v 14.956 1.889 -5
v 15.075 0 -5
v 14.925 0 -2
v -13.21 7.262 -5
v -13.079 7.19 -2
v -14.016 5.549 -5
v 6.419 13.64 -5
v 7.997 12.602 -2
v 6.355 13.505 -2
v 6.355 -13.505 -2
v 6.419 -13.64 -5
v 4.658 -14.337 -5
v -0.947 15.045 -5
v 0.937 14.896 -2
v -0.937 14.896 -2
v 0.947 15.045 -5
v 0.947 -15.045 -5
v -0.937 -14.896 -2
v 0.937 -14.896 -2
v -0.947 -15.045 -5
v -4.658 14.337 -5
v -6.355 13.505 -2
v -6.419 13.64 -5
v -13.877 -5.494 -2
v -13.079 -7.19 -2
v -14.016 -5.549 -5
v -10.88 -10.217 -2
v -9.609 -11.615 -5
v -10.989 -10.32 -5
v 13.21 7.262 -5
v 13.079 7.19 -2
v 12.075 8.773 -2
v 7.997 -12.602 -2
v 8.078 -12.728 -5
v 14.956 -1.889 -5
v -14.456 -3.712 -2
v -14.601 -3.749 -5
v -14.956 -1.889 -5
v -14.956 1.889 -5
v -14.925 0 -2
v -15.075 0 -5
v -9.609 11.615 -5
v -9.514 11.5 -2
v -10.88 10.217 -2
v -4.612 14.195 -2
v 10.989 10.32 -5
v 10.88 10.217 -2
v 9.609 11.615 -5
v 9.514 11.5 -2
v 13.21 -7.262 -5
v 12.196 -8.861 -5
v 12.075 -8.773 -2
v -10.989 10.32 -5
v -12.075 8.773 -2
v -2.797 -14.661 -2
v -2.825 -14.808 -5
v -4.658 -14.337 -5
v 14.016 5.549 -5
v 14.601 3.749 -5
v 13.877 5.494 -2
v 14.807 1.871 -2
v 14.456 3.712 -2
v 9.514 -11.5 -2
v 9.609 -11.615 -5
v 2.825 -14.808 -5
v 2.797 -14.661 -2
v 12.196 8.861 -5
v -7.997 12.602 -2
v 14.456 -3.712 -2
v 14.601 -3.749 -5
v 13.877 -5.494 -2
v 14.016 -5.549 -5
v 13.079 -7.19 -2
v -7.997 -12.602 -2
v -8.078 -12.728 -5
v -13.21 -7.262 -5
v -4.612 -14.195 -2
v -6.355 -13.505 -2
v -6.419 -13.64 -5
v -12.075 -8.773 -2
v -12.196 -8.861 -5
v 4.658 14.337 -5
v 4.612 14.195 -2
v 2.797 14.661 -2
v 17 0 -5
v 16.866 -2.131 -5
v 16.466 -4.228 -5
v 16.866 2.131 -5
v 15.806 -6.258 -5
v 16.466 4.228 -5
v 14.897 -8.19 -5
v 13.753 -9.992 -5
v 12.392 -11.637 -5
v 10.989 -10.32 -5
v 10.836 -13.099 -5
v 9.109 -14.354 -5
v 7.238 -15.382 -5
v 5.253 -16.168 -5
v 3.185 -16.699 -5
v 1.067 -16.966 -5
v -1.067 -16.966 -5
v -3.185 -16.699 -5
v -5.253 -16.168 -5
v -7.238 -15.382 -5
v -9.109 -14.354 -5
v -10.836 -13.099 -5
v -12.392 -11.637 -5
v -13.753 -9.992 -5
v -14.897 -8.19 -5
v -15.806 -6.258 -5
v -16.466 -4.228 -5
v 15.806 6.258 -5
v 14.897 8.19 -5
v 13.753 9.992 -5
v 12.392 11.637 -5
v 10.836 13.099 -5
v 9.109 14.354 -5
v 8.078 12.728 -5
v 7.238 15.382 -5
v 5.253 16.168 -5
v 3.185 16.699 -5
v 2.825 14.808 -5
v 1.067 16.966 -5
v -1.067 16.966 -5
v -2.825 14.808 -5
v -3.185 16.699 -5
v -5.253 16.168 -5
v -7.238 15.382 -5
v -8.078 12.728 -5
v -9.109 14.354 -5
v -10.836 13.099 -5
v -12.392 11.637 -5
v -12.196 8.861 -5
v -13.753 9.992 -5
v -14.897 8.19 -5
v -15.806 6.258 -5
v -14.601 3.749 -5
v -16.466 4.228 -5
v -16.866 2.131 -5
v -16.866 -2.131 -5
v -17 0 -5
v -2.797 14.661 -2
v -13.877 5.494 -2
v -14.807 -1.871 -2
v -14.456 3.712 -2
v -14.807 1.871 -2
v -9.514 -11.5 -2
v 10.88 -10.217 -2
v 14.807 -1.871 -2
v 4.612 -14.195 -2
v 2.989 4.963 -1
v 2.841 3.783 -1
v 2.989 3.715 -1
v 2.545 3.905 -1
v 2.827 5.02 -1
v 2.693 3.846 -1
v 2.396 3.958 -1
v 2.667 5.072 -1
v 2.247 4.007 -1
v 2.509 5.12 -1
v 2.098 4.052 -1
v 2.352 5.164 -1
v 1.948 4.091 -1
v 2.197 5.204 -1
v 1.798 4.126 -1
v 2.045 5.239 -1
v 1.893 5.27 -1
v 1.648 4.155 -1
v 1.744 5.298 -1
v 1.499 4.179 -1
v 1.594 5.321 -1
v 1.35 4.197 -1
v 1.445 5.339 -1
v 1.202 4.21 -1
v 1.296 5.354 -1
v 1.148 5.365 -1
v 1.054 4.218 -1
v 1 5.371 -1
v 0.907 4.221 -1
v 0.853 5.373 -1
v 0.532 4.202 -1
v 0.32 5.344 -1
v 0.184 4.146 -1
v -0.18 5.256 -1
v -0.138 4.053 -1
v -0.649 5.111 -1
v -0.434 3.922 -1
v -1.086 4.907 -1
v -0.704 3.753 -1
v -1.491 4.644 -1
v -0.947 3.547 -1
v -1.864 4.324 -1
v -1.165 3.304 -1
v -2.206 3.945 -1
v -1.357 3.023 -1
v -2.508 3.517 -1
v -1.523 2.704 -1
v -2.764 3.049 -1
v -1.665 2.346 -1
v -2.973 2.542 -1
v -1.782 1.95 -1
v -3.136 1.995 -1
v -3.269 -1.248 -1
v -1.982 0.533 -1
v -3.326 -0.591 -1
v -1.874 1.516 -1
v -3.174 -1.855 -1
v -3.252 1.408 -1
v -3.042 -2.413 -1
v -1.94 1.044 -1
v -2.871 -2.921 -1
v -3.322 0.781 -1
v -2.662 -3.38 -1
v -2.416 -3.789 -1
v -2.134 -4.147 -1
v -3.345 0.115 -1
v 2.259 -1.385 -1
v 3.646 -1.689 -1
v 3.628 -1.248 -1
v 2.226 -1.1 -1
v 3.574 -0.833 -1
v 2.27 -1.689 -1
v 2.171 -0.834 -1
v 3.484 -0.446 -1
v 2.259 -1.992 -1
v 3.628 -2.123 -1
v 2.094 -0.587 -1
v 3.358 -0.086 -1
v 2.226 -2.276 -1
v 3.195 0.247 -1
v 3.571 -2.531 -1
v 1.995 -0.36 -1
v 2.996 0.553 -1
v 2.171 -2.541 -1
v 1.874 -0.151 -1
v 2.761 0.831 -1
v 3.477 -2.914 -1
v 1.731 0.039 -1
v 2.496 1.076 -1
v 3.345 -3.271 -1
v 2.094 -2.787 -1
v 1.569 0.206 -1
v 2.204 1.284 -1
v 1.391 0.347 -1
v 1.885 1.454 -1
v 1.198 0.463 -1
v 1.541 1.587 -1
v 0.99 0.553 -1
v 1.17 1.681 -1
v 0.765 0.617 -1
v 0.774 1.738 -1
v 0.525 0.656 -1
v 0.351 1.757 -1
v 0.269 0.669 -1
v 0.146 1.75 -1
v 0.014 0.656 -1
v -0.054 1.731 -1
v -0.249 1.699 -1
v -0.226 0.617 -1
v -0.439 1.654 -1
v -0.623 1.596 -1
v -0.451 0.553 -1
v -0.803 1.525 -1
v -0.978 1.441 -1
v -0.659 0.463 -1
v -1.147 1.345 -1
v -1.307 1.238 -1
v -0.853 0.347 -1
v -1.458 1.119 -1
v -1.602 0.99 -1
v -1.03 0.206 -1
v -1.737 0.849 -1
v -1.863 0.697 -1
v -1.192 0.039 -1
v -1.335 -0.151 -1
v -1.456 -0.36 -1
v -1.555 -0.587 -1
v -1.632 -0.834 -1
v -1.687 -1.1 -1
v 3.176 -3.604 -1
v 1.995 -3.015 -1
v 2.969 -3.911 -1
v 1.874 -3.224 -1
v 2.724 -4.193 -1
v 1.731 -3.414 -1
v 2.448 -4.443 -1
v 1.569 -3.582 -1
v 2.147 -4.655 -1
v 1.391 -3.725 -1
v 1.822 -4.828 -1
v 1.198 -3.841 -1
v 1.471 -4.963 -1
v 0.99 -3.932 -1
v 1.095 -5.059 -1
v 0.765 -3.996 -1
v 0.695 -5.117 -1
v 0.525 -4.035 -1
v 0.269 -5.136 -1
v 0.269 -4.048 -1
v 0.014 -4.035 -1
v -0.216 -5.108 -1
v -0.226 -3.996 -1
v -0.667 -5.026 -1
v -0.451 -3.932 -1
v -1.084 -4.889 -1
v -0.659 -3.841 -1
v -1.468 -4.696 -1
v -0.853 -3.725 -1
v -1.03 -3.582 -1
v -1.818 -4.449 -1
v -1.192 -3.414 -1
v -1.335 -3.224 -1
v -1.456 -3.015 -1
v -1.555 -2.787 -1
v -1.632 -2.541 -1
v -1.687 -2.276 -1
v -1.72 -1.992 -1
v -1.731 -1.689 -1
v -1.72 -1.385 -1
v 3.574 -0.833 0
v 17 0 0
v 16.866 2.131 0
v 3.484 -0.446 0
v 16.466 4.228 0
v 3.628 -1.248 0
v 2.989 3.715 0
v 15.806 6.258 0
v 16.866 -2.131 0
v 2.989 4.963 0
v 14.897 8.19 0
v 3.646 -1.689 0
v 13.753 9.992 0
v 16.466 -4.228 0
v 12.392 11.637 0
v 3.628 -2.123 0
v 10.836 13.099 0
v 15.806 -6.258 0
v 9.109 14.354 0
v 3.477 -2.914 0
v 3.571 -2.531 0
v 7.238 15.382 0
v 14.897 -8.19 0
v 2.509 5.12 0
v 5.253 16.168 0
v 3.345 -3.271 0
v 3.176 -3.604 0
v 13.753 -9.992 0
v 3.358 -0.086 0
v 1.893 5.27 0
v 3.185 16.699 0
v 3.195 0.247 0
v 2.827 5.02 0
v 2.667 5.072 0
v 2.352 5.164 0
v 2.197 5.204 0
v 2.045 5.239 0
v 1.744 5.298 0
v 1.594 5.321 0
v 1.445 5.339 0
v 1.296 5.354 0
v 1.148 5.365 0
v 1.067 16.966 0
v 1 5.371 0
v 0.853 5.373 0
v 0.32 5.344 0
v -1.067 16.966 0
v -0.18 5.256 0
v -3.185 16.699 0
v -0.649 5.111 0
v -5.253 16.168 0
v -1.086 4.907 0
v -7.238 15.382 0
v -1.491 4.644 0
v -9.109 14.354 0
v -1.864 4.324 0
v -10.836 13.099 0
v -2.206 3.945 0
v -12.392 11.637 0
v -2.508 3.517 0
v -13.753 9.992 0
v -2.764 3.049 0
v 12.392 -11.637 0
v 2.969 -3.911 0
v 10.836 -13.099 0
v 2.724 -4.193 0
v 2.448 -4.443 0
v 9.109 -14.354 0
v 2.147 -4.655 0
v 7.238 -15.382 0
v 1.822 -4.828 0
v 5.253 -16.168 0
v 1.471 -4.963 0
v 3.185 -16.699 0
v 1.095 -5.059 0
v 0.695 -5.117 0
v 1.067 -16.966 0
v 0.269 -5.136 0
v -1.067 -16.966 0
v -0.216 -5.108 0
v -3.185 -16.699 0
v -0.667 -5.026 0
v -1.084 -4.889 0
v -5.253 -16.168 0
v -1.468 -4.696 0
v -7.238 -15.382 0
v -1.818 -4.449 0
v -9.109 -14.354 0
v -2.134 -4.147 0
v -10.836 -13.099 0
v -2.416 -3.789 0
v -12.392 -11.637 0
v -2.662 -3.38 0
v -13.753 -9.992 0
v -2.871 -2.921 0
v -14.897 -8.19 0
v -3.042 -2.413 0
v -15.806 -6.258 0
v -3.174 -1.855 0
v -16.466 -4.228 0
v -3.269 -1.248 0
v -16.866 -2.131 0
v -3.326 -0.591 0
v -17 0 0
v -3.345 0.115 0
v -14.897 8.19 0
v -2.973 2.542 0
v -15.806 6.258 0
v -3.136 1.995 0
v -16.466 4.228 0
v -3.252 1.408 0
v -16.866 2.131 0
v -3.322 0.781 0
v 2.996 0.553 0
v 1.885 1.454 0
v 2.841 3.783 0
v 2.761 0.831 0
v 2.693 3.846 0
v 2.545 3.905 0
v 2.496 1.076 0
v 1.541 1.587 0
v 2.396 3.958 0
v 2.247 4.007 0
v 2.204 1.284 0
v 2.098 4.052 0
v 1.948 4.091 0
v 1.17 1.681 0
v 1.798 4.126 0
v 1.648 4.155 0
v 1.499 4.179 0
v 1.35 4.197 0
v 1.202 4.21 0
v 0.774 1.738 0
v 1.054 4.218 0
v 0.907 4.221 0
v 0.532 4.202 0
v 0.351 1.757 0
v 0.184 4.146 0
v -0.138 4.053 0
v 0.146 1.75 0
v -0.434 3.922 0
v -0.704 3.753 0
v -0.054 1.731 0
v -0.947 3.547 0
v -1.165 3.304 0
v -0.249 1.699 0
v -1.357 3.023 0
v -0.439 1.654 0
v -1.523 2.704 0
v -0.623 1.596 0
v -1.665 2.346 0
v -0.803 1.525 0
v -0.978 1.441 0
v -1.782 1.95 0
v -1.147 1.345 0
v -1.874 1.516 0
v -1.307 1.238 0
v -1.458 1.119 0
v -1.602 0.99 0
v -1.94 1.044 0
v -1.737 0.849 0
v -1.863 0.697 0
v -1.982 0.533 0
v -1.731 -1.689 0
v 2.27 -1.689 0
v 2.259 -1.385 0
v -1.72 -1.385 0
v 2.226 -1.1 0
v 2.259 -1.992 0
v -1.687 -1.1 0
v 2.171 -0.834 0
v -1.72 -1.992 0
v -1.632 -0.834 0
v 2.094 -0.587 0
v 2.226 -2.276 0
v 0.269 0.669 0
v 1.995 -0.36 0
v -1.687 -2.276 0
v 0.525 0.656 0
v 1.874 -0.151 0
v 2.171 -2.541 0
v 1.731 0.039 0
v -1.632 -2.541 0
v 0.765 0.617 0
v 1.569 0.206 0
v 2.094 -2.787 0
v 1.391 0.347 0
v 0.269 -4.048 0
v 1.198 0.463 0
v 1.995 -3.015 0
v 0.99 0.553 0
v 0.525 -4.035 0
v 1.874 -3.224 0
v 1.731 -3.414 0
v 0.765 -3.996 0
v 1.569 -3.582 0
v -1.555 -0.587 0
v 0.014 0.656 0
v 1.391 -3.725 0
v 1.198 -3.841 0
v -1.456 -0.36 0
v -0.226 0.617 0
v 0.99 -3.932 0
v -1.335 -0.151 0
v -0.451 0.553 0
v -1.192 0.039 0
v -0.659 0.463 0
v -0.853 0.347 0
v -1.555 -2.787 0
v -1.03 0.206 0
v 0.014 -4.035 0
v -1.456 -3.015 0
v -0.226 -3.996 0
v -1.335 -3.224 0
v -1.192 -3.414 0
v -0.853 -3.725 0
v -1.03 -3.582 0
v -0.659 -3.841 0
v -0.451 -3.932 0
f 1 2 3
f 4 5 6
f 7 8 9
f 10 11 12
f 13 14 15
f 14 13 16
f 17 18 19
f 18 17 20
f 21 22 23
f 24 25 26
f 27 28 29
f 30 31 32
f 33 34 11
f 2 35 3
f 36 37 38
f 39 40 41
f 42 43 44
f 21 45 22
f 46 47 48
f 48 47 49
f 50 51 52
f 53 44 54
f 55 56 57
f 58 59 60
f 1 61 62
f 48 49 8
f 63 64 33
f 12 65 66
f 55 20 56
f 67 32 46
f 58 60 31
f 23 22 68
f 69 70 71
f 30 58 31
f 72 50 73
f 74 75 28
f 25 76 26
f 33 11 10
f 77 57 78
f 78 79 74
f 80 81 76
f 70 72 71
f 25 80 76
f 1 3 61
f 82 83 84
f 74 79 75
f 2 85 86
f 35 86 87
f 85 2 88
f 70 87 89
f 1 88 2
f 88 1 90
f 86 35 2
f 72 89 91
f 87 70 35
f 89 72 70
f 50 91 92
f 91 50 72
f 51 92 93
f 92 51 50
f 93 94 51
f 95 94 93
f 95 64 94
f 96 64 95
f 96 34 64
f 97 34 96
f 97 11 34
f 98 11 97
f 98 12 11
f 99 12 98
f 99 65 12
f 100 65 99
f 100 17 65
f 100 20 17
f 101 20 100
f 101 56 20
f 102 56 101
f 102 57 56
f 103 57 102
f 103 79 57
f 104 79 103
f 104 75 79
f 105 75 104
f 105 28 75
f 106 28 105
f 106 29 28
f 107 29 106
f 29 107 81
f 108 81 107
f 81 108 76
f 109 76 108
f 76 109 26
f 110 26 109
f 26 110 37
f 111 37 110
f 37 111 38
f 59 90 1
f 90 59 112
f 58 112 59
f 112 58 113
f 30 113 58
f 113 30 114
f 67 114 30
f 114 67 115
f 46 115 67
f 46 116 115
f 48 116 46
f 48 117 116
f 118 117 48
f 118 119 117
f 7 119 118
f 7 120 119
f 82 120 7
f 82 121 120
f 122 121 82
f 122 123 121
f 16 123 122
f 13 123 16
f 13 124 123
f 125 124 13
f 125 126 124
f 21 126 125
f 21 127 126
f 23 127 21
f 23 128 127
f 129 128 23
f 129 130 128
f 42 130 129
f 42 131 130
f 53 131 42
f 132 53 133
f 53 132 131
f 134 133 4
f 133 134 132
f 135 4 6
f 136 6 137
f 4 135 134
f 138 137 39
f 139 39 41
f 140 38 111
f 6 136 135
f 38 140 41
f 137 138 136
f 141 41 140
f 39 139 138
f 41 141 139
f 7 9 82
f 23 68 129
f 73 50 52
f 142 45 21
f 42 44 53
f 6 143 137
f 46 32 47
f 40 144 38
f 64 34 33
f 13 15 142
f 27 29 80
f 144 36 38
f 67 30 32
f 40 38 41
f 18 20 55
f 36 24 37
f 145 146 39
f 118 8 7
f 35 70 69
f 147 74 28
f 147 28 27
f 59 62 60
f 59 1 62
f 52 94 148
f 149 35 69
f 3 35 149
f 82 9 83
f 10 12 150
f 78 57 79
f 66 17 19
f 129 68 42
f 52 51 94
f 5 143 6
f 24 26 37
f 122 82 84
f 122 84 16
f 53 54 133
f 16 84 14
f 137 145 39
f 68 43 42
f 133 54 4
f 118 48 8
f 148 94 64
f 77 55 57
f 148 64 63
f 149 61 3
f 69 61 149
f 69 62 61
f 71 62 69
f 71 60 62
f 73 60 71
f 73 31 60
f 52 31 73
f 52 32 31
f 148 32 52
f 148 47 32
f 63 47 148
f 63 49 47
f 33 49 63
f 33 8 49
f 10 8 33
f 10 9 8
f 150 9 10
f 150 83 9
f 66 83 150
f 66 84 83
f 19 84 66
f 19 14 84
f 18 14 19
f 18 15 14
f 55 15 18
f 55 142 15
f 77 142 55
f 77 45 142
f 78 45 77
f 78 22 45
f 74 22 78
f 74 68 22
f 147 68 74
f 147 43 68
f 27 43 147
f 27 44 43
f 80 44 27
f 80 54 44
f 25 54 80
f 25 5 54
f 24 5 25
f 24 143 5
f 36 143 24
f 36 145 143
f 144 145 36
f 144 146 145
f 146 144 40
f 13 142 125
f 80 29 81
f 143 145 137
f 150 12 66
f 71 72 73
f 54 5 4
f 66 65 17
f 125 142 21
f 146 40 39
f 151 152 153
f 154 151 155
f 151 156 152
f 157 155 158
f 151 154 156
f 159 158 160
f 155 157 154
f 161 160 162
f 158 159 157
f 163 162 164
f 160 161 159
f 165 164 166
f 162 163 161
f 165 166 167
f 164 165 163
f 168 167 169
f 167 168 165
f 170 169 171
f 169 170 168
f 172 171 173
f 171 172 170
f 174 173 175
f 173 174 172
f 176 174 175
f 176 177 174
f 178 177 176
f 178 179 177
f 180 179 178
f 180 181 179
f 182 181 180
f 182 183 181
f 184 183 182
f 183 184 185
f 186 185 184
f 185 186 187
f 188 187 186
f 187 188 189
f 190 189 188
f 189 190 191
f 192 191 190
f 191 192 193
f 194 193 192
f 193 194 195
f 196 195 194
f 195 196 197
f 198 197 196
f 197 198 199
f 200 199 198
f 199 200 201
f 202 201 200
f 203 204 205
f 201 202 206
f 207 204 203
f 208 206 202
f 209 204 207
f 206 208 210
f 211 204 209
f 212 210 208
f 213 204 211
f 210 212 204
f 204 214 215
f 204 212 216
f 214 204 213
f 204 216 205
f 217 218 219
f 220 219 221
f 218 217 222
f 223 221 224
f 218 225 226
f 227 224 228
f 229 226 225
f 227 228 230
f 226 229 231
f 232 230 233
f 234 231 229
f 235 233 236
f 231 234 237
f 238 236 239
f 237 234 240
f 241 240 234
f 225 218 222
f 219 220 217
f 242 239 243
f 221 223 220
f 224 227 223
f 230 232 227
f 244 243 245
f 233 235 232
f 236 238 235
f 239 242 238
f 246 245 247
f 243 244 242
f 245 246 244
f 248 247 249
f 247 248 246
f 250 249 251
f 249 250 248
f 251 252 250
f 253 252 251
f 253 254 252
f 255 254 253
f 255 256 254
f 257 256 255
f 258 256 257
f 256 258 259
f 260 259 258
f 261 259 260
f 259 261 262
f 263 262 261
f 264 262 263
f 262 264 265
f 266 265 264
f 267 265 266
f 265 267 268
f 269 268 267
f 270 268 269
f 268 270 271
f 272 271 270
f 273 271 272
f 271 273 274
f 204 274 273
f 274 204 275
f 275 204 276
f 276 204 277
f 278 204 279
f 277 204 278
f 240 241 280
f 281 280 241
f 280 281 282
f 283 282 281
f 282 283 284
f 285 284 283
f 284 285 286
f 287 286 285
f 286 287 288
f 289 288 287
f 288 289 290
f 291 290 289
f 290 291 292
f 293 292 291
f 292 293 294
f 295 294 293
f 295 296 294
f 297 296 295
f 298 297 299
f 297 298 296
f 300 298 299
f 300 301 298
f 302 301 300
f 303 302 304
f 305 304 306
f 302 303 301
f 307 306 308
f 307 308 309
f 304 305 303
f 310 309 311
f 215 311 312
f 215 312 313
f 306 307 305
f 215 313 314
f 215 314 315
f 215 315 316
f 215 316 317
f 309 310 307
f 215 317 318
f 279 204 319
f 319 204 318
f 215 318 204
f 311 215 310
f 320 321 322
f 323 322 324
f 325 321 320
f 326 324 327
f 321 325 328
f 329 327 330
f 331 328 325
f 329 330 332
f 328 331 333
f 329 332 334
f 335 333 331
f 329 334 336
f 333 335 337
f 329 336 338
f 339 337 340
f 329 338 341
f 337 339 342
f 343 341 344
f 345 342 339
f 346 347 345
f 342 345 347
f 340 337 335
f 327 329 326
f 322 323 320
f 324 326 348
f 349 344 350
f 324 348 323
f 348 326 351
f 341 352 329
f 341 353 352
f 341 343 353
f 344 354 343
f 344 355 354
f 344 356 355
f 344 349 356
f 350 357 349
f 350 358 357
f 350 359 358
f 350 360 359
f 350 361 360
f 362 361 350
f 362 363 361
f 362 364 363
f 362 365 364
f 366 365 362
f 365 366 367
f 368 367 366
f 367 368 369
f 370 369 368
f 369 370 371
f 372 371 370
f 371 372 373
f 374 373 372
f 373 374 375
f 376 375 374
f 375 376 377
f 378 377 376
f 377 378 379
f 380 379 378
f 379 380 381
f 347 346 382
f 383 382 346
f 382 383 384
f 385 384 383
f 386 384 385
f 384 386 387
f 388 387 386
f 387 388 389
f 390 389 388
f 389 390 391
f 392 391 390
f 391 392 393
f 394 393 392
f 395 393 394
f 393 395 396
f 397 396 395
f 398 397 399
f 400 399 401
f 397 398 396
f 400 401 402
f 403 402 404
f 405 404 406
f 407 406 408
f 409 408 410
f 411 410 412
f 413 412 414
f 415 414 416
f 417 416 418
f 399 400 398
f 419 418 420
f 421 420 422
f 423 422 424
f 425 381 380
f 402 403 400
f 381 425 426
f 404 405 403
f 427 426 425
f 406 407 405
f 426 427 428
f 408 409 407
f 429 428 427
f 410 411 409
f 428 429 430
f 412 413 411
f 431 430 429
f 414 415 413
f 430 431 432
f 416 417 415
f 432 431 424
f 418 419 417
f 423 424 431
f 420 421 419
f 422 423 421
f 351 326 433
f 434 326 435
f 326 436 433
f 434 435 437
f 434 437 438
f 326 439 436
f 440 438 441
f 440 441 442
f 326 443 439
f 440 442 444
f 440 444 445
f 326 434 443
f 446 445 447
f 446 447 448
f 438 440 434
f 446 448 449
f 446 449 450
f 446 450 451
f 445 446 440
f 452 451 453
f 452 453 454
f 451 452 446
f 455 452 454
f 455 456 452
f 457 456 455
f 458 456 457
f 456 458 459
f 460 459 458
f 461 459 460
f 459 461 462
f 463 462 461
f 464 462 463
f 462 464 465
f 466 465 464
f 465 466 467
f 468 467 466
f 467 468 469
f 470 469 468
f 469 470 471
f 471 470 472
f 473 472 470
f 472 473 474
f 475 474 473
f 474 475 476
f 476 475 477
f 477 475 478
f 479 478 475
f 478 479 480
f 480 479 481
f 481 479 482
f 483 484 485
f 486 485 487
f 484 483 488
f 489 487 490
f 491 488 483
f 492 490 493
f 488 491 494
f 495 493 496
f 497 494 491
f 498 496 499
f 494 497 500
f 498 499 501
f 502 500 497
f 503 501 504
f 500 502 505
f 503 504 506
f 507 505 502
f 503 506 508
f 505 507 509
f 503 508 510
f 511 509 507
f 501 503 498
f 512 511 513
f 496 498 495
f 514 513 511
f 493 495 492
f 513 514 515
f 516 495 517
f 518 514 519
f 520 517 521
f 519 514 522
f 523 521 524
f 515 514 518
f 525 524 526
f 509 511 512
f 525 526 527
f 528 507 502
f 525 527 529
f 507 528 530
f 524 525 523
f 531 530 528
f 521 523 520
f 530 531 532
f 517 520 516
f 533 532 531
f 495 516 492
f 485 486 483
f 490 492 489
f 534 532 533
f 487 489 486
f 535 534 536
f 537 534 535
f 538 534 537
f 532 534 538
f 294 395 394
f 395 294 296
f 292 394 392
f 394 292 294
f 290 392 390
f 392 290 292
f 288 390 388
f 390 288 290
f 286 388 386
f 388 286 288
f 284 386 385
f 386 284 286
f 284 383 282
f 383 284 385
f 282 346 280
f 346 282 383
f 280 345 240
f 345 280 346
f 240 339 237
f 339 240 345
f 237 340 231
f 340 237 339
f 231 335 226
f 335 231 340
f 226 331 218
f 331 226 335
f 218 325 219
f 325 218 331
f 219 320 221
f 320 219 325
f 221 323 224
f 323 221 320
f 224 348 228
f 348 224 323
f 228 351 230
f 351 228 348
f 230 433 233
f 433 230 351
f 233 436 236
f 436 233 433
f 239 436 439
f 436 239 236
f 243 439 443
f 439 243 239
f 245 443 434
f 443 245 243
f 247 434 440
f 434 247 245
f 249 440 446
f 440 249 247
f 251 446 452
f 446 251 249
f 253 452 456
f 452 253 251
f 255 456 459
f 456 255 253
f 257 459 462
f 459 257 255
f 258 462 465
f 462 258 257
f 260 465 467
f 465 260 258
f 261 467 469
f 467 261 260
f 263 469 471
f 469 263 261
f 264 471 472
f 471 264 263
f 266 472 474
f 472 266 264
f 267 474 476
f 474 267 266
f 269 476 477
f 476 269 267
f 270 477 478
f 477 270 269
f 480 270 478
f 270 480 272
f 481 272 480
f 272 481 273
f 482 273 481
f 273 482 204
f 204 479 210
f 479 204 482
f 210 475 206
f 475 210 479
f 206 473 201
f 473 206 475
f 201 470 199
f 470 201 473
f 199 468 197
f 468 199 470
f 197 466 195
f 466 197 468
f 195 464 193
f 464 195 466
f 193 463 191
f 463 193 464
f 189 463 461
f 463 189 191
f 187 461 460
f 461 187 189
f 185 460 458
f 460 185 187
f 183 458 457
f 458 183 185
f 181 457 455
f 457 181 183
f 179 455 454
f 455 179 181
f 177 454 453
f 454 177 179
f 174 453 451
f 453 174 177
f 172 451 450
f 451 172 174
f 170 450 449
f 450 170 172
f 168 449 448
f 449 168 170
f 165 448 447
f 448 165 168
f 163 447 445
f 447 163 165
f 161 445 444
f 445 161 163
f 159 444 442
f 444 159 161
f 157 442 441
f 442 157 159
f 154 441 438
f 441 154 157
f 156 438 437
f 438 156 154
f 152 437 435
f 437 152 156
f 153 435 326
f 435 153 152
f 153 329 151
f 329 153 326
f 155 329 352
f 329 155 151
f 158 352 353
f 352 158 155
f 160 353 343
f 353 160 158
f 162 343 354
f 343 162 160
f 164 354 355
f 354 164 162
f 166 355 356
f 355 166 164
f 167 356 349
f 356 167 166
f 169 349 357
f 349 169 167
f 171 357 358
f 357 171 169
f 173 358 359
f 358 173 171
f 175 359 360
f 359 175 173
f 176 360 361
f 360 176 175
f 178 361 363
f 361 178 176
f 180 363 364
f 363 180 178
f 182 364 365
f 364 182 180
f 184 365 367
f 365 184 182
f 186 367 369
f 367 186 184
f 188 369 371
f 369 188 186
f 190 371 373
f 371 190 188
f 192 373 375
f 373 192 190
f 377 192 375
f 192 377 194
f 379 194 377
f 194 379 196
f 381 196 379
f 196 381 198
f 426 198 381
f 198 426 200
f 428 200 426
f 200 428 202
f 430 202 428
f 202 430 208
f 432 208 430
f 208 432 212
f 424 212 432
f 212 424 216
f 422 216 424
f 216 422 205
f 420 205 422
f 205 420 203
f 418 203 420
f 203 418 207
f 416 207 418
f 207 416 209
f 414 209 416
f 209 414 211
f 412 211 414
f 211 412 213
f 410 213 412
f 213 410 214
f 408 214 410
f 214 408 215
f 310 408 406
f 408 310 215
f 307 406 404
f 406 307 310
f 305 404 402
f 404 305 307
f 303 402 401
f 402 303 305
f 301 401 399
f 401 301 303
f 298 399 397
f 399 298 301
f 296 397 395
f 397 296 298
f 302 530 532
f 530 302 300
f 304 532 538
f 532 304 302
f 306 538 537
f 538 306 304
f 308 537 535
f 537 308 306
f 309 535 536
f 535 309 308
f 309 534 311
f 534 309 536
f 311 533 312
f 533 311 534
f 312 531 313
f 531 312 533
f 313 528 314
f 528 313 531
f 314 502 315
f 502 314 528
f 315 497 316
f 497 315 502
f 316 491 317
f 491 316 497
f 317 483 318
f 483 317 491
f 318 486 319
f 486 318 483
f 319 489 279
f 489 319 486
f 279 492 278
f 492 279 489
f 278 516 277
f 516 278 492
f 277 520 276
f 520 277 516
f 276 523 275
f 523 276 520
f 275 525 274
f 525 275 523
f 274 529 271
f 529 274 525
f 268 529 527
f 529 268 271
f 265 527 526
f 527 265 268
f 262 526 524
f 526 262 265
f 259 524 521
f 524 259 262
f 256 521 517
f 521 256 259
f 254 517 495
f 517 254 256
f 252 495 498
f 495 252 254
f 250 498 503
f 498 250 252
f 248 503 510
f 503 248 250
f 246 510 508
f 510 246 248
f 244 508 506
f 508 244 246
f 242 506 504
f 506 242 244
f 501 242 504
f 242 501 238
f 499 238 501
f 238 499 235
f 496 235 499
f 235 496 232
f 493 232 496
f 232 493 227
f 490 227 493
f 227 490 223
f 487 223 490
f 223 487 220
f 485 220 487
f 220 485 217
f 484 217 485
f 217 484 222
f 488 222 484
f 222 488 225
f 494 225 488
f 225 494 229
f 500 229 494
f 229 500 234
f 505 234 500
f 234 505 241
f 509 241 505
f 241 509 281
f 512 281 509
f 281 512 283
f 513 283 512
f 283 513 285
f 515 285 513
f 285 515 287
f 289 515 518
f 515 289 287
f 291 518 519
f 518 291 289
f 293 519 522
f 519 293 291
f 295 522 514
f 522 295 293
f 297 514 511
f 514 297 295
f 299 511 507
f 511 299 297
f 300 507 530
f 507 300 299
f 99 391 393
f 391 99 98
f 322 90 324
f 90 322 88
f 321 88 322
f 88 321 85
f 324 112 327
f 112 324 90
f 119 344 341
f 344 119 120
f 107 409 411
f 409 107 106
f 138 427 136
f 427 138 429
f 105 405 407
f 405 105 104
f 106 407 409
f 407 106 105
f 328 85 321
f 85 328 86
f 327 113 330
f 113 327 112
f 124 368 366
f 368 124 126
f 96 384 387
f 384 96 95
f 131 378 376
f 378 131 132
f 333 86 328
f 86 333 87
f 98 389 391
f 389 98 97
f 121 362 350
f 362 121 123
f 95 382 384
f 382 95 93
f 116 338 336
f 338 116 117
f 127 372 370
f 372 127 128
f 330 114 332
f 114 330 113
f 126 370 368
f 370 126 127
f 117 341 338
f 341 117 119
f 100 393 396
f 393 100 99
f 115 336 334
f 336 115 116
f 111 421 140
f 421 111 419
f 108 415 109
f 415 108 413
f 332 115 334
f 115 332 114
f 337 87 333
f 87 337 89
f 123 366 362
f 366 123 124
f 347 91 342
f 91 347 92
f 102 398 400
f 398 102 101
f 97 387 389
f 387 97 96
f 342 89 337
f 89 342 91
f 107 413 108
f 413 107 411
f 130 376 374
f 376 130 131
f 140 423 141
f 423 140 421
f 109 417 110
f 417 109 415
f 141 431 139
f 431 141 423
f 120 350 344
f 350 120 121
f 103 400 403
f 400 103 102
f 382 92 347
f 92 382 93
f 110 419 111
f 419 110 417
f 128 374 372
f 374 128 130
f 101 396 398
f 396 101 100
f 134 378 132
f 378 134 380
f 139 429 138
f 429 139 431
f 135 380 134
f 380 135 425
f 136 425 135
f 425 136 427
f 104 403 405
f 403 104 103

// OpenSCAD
$fn = 50;

difference() {
	union() {
		translate(v = [0, 0, -5.0]) {
			cylinder(h = 5, r = 17.0);
		}
	}
	union() {
		#translate(v = [0, 0, -5.0]) {
			cylinder(h = 3, r1 = 15.075, r2 = 14.925);
		}
		translate(v = [0, 0, -1]) {
			linear_extrude(height = 1) {
				text(font = "Impact", halign = "center", size = 10, text = "6", valign = "center");
			}
		}
	}
}
